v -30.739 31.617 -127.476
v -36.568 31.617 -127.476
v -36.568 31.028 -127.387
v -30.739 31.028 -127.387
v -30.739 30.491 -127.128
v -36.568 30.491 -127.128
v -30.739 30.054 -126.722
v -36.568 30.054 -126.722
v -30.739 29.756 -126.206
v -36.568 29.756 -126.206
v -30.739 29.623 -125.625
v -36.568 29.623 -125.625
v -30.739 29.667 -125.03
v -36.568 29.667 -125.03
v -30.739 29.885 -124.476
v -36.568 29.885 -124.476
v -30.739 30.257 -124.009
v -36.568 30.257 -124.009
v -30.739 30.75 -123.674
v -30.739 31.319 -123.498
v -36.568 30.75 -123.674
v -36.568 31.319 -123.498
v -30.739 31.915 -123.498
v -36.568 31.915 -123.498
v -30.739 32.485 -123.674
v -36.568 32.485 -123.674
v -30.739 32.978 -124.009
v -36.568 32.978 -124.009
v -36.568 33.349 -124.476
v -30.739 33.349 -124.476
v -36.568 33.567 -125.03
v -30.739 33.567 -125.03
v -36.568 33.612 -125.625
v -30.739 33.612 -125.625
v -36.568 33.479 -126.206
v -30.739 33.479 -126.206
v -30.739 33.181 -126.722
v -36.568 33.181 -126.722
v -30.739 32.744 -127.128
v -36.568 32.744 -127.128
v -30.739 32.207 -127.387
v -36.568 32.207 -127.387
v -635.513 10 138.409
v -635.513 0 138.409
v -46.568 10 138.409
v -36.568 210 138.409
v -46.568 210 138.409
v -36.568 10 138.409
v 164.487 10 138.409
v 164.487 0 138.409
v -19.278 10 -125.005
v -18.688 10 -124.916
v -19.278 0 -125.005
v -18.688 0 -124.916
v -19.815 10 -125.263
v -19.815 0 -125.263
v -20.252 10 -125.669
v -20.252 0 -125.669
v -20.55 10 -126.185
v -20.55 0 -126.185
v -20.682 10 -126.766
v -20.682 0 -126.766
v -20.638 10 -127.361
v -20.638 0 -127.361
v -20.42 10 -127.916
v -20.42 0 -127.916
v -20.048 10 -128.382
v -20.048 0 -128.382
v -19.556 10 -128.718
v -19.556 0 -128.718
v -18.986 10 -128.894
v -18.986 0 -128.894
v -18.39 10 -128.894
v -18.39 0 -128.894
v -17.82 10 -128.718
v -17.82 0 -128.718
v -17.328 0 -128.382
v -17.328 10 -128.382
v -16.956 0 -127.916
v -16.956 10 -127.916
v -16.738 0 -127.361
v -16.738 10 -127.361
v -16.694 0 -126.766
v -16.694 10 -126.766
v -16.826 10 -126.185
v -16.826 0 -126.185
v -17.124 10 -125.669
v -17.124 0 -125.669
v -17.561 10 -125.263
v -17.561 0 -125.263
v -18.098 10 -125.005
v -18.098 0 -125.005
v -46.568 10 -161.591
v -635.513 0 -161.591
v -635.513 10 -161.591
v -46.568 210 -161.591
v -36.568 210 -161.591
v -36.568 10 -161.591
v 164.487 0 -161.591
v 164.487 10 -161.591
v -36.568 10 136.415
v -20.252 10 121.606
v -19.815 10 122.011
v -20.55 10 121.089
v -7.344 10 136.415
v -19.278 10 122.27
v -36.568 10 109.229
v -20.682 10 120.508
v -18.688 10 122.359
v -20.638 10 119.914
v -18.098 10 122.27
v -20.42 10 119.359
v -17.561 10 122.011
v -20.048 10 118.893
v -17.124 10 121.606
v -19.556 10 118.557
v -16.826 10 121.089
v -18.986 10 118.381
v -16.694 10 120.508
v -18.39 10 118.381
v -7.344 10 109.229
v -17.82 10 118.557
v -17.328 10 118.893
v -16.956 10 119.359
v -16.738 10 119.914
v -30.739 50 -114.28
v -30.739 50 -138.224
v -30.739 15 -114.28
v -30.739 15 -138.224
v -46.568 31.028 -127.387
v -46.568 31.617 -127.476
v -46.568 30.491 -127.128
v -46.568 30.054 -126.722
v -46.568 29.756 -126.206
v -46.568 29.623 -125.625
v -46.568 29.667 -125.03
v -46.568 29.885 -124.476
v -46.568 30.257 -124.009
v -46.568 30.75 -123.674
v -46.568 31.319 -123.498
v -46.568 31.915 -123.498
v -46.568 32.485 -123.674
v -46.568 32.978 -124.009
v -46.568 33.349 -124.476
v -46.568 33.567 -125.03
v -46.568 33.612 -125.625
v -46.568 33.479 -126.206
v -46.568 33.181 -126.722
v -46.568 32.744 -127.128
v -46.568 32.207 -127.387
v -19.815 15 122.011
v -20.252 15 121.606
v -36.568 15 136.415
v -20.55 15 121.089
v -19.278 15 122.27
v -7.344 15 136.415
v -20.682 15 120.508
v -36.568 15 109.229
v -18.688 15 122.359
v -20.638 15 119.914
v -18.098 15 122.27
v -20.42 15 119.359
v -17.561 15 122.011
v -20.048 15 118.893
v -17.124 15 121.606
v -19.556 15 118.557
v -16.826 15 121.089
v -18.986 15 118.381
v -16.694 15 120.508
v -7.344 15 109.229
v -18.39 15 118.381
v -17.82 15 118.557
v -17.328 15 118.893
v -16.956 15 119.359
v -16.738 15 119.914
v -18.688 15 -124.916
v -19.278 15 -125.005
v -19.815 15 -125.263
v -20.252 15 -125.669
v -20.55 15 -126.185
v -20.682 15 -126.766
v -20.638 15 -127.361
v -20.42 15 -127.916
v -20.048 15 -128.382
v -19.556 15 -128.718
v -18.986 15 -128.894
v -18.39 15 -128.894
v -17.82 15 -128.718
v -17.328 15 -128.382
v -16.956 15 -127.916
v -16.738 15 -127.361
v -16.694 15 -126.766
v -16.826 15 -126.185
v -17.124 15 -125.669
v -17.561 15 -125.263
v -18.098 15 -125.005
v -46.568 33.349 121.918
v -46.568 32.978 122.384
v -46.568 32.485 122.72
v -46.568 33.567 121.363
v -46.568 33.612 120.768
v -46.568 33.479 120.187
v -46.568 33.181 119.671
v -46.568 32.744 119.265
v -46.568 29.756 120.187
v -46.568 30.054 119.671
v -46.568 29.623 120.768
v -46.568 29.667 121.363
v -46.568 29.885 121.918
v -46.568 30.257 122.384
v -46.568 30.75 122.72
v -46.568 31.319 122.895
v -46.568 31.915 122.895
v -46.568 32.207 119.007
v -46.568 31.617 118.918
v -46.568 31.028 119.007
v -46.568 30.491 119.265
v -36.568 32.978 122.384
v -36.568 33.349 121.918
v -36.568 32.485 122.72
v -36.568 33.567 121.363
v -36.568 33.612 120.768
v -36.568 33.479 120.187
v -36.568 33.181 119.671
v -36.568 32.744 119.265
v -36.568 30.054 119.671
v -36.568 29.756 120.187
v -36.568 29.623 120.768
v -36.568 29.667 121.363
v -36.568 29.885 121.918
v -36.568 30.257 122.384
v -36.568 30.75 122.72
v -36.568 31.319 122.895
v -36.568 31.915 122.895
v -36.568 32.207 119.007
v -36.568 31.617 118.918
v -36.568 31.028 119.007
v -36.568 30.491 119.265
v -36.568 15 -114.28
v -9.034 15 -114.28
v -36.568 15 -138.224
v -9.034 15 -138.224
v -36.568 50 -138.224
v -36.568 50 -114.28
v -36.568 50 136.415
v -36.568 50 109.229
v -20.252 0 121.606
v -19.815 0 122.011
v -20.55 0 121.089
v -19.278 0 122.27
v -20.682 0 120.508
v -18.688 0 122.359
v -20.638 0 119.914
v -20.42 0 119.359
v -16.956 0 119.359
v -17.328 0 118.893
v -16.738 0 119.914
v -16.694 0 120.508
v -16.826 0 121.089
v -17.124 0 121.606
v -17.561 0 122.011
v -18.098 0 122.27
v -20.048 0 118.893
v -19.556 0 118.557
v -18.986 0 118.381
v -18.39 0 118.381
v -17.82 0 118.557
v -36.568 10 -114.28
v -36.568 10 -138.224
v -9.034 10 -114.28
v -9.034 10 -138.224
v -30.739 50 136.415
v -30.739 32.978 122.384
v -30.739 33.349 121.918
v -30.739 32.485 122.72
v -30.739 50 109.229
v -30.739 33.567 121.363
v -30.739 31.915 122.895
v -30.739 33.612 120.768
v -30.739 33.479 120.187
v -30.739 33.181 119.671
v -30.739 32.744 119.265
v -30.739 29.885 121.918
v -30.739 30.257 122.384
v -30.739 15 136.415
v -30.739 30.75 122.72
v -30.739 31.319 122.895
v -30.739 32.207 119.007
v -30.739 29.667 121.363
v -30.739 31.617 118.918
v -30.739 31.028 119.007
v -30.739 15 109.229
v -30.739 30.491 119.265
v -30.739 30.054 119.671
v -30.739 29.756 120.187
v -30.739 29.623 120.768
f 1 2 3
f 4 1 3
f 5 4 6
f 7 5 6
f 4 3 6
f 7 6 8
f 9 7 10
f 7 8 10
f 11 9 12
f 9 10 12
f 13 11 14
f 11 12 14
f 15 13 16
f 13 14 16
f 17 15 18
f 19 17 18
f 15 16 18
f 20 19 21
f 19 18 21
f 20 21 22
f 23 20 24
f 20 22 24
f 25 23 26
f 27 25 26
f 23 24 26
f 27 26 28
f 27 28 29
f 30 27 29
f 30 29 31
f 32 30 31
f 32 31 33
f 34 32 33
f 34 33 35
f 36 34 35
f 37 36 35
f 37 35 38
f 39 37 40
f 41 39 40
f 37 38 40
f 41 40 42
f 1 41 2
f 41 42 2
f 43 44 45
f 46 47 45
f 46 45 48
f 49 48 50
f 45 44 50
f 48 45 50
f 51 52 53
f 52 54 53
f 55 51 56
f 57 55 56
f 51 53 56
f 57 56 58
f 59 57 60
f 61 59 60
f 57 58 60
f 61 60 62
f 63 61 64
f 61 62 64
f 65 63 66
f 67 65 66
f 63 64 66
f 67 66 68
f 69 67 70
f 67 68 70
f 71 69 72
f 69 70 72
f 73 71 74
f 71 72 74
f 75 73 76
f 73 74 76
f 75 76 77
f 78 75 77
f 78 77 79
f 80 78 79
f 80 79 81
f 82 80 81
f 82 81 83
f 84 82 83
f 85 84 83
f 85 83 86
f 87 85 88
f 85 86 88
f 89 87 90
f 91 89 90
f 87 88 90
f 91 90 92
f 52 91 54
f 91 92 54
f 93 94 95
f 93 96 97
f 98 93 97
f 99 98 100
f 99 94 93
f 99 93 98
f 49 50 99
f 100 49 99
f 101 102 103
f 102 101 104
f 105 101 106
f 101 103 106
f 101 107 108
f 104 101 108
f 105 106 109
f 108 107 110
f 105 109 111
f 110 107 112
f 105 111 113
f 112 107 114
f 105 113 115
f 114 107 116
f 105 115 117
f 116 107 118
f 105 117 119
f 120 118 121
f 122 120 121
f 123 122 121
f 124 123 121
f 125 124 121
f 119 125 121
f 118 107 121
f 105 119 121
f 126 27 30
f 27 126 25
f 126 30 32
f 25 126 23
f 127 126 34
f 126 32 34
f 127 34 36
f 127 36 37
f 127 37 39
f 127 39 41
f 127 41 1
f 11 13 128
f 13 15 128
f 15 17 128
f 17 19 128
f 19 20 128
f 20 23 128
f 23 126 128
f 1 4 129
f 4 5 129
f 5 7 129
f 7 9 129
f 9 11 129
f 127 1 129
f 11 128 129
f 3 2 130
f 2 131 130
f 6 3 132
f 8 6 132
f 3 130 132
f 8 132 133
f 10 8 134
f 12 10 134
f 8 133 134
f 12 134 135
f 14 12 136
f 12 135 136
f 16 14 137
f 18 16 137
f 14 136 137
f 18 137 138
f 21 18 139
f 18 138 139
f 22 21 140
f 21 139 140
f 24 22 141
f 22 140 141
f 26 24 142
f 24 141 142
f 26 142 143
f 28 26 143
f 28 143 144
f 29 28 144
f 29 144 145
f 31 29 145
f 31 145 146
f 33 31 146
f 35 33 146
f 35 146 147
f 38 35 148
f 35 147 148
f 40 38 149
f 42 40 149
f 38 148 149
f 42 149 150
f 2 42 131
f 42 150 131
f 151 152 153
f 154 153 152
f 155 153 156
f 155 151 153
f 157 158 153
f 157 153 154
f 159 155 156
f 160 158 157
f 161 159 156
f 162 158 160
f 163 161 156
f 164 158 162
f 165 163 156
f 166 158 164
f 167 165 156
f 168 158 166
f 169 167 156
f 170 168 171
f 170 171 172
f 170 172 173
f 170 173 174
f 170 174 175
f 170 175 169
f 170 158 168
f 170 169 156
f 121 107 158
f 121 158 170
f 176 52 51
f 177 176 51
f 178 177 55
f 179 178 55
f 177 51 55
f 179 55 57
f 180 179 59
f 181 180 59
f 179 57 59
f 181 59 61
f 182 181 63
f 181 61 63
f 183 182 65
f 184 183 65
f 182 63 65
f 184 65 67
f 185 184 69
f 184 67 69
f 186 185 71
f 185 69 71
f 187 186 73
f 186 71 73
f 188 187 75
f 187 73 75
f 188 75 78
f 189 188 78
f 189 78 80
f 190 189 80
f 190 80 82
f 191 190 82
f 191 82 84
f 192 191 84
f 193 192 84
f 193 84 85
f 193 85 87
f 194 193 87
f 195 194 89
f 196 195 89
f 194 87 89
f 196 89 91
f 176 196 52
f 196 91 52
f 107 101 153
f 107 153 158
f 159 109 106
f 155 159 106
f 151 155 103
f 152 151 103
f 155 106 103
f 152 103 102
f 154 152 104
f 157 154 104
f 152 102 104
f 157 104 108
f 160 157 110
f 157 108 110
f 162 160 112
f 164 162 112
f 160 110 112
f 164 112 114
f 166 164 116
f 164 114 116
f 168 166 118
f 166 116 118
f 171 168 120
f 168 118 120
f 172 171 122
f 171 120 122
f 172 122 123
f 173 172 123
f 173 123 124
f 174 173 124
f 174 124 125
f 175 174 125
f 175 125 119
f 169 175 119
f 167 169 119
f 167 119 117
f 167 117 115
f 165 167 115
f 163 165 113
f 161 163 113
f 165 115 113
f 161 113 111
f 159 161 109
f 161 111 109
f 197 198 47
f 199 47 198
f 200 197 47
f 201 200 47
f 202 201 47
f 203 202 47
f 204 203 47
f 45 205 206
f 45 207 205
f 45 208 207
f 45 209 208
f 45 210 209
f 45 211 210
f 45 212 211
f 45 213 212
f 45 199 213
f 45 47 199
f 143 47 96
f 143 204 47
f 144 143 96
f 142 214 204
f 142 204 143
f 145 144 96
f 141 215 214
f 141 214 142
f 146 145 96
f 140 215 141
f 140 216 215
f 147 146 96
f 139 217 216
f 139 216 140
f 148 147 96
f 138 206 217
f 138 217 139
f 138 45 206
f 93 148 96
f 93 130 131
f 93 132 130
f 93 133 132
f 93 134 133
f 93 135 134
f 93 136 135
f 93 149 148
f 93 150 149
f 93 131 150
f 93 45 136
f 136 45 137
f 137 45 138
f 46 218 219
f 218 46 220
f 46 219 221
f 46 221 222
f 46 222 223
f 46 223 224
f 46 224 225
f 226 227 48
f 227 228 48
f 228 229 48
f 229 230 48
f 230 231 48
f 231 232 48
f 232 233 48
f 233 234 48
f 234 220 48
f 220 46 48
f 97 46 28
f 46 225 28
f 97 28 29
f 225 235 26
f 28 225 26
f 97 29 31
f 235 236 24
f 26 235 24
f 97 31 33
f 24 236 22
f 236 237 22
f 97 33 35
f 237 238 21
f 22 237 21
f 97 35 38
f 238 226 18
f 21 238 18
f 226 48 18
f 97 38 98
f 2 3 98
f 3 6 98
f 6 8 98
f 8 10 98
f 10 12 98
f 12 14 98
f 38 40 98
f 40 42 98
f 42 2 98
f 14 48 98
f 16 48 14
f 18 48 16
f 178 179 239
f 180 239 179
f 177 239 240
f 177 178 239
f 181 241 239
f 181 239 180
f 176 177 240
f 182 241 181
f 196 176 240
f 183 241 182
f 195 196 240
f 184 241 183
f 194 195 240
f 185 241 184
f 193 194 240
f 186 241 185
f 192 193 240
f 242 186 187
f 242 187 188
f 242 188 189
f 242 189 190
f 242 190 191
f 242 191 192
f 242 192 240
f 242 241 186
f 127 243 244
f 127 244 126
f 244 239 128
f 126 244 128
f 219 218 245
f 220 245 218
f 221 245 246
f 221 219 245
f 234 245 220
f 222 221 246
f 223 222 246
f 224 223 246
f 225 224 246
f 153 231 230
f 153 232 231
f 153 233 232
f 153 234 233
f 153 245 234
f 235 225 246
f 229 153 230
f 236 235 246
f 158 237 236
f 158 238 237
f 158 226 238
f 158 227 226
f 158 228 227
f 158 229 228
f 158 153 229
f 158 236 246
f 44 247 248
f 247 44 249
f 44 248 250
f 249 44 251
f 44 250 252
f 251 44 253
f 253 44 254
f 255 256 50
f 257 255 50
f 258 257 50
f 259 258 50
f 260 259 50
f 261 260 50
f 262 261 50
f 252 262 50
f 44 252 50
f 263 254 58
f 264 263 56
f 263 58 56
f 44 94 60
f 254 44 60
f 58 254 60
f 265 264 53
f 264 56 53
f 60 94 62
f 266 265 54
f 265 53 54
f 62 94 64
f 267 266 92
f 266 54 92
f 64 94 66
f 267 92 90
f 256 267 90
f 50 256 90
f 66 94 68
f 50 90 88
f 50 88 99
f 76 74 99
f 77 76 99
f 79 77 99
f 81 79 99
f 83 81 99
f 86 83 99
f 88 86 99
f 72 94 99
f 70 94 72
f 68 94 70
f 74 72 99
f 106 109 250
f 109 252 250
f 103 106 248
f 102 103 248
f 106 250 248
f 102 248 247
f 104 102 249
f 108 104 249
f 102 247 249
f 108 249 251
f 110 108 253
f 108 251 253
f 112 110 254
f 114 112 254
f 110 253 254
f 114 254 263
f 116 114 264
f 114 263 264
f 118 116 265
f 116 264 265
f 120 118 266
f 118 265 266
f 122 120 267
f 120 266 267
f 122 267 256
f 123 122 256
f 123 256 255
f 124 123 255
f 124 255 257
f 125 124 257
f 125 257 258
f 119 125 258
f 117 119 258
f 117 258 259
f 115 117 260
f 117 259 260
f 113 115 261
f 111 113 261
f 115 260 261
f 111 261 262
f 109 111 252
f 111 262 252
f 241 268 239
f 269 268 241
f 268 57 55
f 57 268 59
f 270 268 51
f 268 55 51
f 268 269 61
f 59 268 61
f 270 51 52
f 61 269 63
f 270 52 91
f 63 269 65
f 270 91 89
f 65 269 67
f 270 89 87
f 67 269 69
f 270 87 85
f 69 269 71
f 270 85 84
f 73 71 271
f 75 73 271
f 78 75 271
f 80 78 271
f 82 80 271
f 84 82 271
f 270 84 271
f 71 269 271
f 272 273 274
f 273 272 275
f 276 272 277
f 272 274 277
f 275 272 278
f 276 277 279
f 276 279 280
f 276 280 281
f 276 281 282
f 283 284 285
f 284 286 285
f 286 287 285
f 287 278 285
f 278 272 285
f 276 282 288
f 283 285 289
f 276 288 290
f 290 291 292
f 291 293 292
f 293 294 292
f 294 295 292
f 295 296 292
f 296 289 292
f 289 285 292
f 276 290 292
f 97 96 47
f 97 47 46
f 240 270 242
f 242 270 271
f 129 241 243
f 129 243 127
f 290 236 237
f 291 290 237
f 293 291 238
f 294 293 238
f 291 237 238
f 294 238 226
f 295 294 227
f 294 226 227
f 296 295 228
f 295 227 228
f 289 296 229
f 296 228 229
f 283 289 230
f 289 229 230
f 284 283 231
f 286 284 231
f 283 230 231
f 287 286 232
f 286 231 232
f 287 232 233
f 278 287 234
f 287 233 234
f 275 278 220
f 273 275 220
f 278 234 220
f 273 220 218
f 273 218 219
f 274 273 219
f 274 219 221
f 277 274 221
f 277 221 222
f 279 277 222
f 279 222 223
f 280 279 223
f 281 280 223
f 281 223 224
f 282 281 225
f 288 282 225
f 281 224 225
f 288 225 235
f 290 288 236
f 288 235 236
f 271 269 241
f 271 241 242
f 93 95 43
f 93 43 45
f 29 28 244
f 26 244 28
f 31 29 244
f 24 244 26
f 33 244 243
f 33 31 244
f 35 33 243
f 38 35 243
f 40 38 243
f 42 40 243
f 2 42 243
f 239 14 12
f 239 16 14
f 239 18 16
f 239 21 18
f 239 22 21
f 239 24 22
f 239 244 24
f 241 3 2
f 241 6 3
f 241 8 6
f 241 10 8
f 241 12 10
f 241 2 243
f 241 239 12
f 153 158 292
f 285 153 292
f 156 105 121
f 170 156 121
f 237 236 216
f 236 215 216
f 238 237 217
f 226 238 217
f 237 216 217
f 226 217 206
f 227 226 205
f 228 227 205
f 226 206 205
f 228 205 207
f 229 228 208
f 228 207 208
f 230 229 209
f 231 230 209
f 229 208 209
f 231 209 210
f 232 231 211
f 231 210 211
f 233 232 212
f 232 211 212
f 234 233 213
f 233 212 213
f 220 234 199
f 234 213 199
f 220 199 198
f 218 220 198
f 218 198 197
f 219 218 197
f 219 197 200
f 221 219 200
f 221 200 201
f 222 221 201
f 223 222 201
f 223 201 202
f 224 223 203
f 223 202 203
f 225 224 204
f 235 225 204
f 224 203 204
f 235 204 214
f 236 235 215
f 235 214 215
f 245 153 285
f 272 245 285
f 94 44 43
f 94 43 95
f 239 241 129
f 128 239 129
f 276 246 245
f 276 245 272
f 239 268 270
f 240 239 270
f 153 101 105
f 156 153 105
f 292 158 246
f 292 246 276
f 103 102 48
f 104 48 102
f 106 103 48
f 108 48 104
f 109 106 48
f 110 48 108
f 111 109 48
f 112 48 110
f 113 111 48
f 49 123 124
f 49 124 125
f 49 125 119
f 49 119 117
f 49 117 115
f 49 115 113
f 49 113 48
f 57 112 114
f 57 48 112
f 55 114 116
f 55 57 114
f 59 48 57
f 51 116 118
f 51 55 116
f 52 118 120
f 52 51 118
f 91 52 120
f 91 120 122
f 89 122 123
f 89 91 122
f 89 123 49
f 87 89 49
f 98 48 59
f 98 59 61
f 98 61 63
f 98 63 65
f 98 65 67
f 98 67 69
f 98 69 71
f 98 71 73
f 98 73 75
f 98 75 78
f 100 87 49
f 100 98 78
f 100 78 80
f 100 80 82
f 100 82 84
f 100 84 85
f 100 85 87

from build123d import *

# Parameters (mm, degrees)
SKETCH1_W                      = 800
SKETCH1_H                      = 300
BOSS_EXTRUDE1_DEPTH            = 10
SKETCH2_W                      = 10
SKETCH2_H                      = 300
BOSS_EXTRUDE2_DEPTH            = 200
SKETCH4_W                      = 29.224082228
SKETCH4_H                      = 27.186820937
BOSS_EXTRUDE4_DEPTH            = 5
SKETCH4_W_2                    = 27.533579719
SKETCH4_H_2                    = 23.943895565
BOSS_EXTRUDE4_2_DEPTH          = 5
SKETCH5_W                      = 5.828784331
SKETCH5_H                      = 27.186820937
BOSS_EXTRUDE5_DEPTH            = 35
SKETCH5_H_2                    = 23.943895565
BOSS_EXTRUDE5_2_DEPTH          = 35
SKETCH7_W                      = 2
SKETCH7_H                      = 15
F_4_0MM_DOWEL_HOLE1_AT_2_COUNT = 2
F_4_0MM_DOWEL_HOLE1_AT_2_PITCH = 247.27458835
SKETCH9_W                      = 2
SKETCH9_H                      = 604.774557392
F_4_0MM_DOWEL_HOLE2_AT_2_COUNT = 2
F_4_0MM_DOWEL_HOLE2_AT_2_PITCH = 246.393174193


with BuildPart() as part:
    # Sketch1 → Boss-Extrude1 (new body)
    with BuildSketch(Plane(origin=(0, 0, 0), x_dir=(1, 0, 0), z_dir=(0, 1, 0))):
        with Locations((-235.513382352, 11.590855644)):
            Rectangle(SKETCH1_W, SKETCH1_H)
    extrude(amount=BOSS_EXTRUDE1_DEPTH)

    # Sketch2 → Boss-Extrude2 (add)
    with BuildSketch(Plane(origin=(0, 10, 0), x_dir=(1, 0, 0), z_dir=(0, 1, 0))):
        with Locations((-41.567634291, 11.590855644)):
            Rectangle(SKETCH2_W, SKETCH2_H)
    extrude(amount=BOSS_EXTRUDE2_DEPTH)


with BuildPart() as body_2:
    # Sketch4 → Boss-Extrude4 (new body)
    with BuildSketch(Plane(origin=(0, 10, 0), x_dir=(1, 0, 0), z_dir=(0, 1, 0))):
        with Locations((-21.955593177, -122.821982617)):
            Rectangle(SKETCH4_W, SKETCH4_H)
    extrude(amount=BOSS_EXTRUDE4_DEPTH)


with BuildPart() as body_3:
    # Sketch4 → Boss-Extrude4 2 (new body)
    with BuildSketch(Plane(origin=(0, 10, 0), x_dir=(1, 0, 0), z_dir=(0, 1, 0))):
        with Locations((-22.800844432, 126.251631239)):
            Rectangle(SKETCH4_W_2, SKETCH4_H_2)
    extrude(amount=BOSS_EXTRUDE4_2_DEPTH)


with BuildPart() as body_4:
    # Sketch5 → Boss-Extrude5 (new body)
    with BuildSketch(Plane(origin=(0, 15, 0), x_dir=(1, 0, 0), z_dir=(0, 1, 0))):
        with Locations((-33.653242126, -122.821982617)):
            Rectangle(SKETCH5_W, SKETCH5_H)
    extrude(amount=BOSS_EXTRUDE5_DEPTH)


with BuildPart() as body_5:
    # Sketch5 → Boss-Extrude5 2 (new body)
    with BuildSketch(Plane(origin=(0, 15, 0), x_dir=(1, 0, 0), z_dir=(0, 1, 0))):
        with Locations((-33.653242126, 126.251631239)):
            Rectangle(SKETCH5_W, SKETCH5_H_2)
    extrude(amount=BOSS_EXTRUDE5_2_DEPTH)


with BuildPart() as f_4_0mm_dowel_hole1_tool:
    # Sketch7 → Ø4.0mm Dowel Hole1 (revolve)
    with BuildSketch(Plane(origin=(-18.687990482, 15, 120.358746082), x_dir=(0, 0, 1), z_dir=(1, 0, 0))):
        with Locations((1, 7.5)):
            Rectangle(SKETCH7_W, SKETCH7_H)
    f_4_0mm_dowel_hole1 = revolve(axis=Axis((-18.687990482, 21.35, 120.358746082), (0, -1, 0)))


with BuildPart() as part_1:
    add(part.part)

    # Ø4.0mm Dowel Hole1: cut by f_4_0mm_dowel_hole1_tool
    add(f_4_0mm_dowel_hole1_tool.part, mode=Mode.SUBTRACT)


with BuildPart() as body_2_1:
    add(body_2.part)

    # Ø4.0mm Dowel Hole1: cut by f_4_0mm_dowel_hole1_tool
    add(f_4_0mm_dowel_hole1_tool.part, mode=Mode.SUBTRACT)


with BuildPart() as f_4_0mm_dowel_hole1_at_2_tool:
    # Ø4.0mm Dowel Hole1 at 2: Ø4.0mm Dowel Hole1 ×2
    with Locations(*[(0, 0, -i * F_4_0MM_DOWEL_HOLE1_AT_2_PITCH) for i in range(1, F_4_0MM_DOWEL_HOLE1_AT_2_COUNT)]):
        add(f_4_0mm_dowel_hole1)


with BuildPart() as part_2:
    add(part_1.part)

    # Ø4.0mm Dowel Hole1 at 2: cut by f_4_0mm_dowel_hole1_at_2_tool
    add(f_4_0mm_dowel_hole1_at_2_tool.part, mode=Mode.SUBTRACT)


with BuildPart() as body_3_1:
    add(body_3.part)

    # Ø4.0mm Dowel Hole1 at 2: cut by f_4_0mm_dowel_hole1_at_2_tool
    add(f_4_0mm_dowel_hole1_at_2_tool.part, mode=Mode.SUBTRACT)


with BuildPart() as f_4_0mm_dowel_hole2_tool:
    # Sketch9 → Ø4.0mm Dowel Hole2 (revolve)
    with BuildSketch(Plane(origin=(-30.73884996, 31.617276176, 120.917654543), x_dir=(0, 0, -1), z_dir=(0, 1, 0))):
        with Locations((1, 302.387278696)):
            Rectangle(SKETCH9_W, SKETCH9_H)
    f_4_0mm_dowel_hole2 = revolve(axis=Axis((-24.38884996, 31.617276176, 120.917654543), (-1, 0, 0)))


with BuildPart() as part_3:
    add(part_2.part)

    # Ø4.0mm Dowel Hole2: cut by f_4_0mm_dowel_hole2_tool
    add(f_4_0mm_dowel_hole2_tool.part, mode=Mode.SUBTRACT)


with BuildPart() as body_4_1:
    add(body_4.part)

    # Ø4.0mm Dowel Hole2: cut by f_4_0mm_dowel_hole2_tool
    add(f_4_0mm_dowel_hole2_tool.part, mode=Mode.SUBTRACT)


with BuildPart() as f_4_0mm_dowel_hole2_at_2_tool:
    # Ø4.0mm Dowel Hole2 at 2: Ø4.0mm Dowel Hole2 ×2
    with Locations(*[(0, 0, -i * F_4_0MM_DOWEL_HOLE2_AT_2_PITCH) for i in range(1, F_4_0MM_DOWEL_HOLE2_AT_2_COUNT)]):
        add(f_4_0mm_dowel_hole2)


with BuildPart() as part_4:
    add(part_3.part)

    # Ø4.0mm Dowel Hole2 at 2: cut by f_4_0mm_dowel_hole2_at_2_tool
    add(f_4_0mm_dowel_hole2_at_2_tool.part, mode=Mode.SUBTRACT)


with BuildPart() as body_5_1:
    add(body_5.part)

    # Ø4.0mm Dowel Hole2 at 2: cut by f_4_0mm_dowel_hole2_at_2_tool
    add(f_4_0mm_dowel_hole2_at_2_tool.part, mode=Mode.SUBTRACT)


solid = Compound([body_2_1.part, body_3_1.part, body_4_1.part, part_4.part, body_5_1.part])
